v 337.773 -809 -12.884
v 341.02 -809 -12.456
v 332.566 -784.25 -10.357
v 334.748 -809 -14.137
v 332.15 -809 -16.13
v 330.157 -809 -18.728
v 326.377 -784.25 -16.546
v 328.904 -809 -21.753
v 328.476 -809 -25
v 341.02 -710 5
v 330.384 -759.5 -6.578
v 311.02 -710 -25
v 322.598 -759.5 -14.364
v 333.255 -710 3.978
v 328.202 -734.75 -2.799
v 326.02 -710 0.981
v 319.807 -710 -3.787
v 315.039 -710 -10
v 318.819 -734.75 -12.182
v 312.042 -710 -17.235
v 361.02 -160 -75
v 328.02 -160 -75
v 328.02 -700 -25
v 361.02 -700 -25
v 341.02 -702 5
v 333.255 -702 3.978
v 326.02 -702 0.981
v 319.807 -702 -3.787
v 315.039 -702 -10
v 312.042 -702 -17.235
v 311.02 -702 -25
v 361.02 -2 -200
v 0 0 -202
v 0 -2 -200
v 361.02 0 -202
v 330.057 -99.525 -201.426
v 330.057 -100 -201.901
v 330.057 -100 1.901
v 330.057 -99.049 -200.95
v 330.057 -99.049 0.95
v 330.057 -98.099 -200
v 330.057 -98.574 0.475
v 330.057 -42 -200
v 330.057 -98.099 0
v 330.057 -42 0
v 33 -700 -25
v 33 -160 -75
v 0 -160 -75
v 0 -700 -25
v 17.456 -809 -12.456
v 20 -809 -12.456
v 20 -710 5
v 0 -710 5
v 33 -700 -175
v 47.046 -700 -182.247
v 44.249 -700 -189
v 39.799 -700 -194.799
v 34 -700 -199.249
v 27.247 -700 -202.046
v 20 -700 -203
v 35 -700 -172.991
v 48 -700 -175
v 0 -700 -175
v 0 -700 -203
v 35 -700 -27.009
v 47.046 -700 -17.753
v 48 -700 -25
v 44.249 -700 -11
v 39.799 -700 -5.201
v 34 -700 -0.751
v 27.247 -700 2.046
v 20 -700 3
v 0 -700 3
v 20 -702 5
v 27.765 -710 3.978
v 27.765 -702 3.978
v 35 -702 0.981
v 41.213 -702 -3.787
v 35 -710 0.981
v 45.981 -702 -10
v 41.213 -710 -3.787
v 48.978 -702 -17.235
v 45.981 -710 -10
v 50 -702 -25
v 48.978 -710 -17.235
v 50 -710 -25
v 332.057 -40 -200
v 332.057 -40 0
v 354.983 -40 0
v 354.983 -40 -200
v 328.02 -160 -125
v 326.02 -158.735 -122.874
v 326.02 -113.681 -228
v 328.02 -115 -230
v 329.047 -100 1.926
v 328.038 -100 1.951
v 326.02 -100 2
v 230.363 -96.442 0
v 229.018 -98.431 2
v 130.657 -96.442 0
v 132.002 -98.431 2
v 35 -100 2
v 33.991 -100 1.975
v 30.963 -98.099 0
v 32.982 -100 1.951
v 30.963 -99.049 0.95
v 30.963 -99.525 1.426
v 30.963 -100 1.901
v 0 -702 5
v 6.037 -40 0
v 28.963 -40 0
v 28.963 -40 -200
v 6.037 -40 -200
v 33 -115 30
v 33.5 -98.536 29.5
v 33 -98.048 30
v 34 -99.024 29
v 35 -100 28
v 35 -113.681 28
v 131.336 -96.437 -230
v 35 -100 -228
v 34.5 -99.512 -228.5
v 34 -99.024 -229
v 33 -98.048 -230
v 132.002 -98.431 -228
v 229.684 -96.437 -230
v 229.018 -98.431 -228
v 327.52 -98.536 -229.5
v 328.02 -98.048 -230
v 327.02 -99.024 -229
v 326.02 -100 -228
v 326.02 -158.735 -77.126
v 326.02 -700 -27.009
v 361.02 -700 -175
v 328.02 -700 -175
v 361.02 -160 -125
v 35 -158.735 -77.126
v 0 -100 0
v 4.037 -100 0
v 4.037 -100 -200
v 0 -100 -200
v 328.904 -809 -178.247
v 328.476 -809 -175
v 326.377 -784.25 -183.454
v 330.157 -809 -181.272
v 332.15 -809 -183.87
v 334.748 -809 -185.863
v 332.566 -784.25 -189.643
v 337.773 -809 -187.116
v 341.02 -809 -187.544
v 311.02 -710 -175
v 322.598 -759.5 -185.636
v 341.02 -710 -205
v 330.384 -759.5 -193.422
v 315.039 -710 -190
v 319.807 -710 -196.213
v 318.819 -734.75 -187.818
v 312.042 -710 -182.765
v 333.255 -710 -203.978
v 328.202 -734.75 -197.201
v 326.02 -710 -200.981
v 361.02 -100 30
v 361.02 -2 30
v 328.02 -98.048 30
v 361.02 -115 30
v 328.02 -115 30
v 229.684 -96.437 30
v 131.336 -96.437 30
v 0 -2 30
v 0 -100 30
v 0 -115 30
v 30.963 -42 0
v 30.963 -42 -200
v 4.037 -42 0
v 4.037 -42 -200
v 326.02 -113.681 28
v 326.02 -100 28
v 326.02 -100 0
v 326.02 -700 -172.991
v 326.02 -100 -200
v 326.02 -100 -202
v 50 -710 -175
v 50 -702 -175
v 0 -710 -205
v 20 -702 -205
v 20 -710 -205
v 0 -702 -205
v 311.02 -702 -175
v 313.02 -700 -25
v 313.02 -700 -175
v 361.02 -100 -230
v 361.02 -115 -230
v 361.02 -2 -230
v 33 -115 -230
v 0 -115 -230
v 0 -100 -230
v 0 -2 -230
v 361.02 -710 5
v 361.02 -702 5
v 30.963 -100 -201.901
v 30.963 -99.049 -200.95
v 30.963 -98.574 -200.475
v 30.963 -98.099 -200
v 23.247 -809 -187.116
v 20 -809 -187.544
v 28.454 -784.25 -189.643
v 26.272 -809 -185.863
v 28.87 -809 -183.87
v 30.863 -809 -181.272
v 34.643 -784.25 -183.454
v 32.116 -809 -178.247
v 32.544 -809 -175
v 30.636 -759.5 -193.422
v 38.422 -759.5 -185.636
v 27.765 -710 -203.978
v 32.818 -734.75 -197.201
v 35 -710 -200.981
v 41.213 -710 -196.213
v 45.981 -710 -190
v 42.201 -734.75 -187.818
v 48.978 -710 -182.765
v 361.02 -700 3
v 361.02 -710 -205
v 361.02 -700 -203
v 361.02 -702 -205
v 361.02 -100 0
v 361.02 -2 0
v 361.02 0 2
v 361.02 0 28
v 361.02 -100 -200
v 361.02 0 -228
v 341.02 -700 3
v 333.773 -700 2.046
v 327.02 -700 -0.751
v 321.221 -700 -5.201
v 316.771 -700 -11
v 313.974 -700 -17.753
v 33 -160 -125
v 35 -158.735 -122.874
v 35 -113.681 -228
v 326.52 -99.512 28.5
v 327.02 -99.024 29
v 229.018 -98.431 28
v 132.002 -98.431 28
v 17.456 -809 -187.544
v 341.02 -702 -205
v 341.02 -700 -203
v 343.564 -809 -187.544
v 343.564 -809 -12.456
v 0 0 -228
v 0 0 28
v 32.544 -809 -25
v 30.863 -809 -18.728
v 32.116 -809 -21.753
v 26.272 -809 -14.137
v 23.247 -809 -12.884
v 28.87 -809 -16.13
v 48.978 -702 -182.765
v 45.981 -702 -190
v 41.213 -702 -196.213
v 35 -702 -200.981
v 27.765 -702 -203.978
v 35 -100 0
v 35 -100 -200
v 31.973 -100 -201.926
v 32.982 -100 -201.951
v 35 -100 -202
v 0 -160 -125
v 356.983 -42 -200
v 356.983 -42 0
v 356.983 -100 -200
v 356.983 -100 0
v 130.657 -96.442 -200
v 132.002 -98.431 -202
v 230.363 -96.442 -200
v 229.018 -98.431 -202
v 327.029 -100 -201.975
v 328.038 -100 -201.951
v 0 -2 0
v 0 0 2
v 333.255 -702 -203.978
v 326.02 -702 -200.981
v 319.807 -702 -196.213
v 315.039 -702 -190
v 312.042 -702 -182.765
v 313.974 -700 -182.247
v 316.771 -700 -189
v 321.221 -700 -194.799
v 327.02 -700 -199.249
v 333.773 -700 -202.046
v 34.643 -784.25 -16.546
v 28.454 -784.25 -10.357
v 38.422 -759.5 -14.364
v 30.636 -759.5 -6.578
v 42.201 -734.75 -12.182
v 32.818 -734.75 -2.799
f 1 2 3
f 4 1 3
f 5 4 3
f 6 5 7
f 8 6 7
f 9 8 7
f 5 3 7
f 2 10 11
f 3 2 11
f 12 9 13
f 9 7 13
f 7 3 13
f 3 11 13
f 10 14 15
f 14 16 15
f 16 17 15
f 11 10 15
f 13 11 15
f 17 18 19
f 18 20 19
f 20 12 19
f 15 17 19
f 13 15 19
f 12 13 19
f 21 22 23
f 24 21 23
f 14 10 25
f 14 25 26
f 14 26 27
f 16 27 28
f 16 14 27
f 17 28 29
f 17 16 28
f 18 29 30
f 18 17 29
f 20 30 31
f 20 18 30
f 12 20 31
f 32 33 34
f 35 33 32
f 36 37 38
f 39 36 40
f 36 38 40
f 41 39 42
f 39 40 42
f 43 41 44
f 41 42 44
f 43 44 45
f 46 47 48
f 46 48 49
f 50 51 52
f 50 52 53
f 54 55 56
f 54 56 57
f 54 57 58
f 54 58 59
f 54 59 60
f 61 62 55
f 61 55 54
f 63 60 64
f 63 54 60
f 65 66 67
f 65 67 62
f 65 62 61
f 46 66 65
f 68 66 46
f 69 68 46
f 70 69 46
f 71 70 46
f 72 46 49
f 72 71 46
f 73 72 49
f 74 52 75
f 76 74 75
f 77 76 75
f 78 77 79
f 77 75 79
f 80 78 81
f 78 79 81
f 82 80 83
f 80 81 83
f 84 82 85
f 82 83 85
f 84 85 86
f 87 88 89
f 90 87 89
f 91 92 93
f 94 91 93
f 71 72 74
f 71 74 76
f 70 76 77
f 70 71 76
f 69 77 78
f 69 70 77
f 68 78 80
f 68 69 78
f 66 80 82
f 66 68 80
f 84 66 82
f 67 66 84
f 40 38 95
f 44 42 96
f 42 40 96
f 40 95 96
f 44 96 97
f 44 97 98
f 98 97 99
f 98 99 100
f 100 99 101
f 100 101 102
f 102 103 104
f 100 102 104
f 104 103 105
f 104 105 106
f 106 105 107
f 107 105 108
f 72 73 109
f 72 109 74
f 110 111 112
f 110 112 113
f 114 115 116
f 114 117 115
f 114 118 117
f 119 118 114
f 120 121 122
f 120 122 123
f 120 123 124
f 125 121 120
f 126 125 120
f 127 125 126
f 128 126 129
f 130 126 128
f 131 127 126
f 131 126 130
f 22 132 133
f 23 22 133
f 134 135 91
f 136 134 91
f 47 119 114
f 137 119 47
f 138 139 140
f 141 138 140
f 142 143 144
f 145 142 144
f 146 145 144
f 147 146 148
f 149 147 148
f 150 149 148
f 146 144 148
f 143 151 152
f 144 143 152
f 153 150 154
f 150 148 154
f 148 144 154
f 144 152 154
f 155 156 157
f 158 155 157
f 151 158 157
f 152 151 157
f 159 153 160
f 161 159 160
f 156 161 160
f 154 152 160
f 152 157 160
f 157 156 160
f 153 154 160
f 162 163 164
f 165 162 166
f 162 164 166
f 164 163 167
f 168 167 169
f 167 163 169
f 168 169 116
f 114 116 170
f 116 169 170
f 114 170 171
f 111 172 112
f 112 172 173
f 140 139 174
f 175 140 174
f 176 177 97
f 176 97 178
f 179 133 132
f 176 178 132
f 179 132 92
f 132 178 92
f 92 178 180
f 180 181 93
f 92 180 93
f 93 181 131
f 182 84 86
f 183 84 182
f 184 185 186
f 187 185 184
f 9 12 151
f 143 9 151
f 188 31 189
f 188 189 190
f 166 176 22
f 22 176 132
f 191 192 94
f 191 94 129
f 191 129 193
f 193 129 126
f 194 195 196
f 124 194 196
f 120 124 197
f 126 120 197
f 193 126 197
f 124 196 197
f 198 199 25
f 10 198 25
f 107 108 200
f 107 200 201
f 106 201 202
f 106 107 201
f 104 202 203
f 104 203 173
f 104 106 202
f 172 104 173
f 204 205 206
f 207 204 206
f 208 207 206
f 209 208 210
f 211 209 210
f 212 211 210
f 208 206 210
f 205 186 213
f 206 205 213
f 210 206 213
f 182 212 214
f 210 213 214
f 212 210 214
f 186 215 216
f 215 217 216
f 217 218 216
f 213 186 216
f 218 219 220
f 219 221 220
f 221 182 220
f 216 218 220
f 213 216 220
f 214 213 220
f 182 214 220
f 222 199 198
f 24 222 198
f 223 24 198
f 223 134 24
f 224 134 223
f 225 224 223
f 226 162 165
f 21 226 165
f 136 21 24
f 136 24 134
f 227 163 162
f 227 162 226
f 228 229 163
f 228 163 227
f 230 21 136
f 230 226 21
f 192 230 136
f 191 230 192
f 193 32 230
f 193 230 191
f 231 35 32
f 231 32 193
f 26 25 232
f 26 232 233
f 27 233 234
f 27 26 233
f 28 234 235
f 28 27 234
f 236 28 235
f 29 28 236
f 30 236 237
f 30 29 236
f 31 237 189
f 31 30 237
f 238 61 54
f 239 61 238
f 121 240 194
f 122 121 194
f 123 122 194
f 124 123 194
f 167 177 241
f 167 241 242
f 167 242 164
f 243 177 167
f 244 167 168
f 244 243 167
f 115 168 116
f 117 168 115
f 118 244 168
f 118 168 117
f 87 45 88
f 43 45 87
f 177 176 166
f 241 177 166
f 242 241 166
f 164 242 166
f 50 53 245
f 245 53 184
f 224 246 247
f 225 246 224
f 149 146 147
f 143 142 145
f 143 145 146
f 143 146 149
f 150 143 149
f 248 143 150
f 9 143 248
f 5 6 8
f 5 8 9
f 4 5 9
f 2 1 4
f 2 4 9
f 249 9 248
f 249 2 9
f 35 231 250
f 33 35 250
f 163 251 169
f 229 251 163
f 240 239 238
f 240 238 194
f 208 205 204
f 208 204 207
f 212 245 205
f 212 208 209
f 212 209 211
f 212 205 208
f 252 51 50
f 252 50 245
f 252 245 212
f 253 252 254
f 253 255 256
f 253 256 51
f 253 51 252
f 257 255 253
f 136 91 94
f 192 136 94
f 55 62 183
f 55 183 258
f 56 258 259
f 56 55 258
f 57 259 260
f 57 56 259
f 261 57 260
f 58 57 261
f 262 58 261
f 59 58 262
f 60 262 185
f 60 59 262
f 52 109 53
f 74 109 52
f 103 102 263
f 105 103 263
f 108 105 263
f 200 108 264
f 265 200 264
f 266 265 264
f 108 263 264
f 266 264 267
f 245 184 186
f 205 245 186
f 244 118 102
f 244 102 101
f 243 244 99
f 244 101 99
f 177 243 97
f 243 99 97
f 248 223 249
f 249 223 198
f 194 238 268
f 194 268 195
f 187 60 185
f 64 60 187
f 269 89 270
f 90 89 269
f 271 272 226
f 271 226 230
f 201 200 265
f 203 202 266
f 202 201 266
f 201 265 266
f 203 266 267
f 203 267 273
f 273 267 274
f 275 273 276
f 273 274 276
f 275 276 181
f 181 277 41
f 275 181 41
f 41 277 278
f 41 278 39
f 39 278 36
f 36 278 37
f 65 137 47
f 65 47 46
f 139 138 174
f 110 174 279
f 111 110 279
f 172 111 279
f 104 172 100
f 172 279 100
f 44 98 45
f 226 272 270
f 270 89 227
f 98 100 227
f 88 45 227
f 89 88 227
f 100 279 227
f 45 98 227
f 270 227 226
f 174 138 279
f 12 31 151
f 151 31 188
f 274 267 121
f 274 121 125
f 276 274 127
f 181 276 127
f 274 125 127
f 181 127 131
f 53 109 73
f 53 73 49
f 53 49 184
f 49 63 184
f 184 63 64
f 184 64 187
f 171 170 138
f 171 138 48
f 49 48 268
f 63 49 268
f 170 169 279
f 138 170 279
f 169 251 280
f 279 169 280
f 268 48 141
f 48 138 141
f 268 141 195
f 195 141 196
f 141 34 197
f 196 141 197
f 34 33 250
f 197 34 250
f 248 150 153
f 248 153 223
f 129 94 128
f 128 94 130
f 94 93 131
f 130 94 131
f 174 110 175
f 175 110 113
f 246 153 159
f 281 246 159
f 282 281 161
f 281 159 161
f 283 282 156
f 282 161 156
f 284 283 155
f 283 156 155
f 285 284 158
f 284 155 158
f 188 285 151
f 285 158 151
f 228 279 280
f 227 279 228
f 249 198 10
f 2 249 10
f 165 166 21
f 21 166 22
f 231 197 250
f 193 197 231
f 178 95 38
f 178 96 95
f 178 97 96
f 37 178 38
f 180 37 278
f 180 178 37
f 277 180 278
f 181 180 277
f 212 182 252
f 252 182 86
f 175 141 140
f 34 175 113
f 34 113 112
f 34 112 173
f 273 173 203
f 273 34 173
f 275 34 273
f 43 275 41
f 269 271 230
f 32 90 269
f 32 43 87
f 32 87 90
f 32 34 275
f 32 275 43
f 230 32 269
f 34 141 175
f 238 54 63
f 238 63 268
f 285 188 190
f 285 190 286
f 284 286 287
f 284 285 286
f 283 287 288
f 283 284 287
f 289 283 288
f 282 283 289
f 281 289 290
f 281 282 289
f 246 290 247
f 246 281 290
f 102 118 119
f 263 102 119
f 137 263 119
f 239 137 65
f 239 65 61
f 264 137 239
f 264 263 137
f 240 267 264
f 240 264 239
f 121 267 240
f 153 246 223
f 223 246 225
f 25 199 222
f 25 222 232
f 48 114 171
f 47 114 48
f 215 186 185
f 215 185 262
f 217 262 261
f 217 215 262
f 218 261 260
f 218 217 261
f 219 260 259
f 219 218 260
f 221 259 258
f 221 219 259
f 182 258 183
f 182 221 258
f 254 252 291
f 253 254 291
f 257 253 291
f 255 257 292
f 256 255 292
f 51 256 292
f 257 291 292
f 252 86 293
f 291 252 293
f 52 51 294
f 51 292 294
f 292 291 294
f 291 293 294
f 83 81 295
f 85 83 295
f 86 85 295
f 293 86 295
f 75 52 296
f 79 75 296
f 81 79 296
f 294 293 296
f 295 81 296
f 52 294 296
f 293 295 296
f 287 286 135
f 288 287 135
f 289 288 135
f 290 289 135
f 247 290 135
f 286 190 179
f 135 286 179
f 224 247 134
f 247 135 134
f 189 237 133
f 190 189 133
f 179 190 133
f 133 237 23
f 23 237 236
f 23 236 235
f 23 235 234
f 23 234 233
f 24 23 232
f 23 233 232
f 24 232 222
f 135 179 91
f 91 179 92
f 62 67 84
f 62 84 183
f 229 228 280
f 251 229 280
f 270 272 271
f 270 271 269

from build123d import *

# Parameters (mm, degrees)
BOSS_EXTRUDE1_DEPTH           = 30
SKETCH2_W                     = 26.926999998
SKETCH2_H                     = 60
BOSS_EXTRUDE2_DEPTH           = 200
BOSS_EXTRUDE3_START           = 30
BOSS_EXTRUDE3_DEPTH           = 30
BOSS_EXTRUDE4_DEPTH           = 4.0365
BOSS_EXTRUDE4_DEPTH_BACK      = 30.9635
BOSS_EXTRUDE5_DEPTH           = 10
FILLET1_R                     = 30
SKETCH7_W                     = 260
SKETCH7_H                     = 710
CUT_EXTRUDE1_DEPTH            = 768.843643003
CHAMFER1_SIZE                 = 2
CHAMFER2_SIZE                 = 2
CHAMFER3_SIZE                 = 2
CHAMFER4_SIZE                 = 2
CHAMFER6_SIZE                 = 2
BOSS_EXTRUDE6_DEPTH           = 99
BOSS_EXTRUDE6_DRAFT           = 10
BOSS_EXTRUDE6_PROFILE_2_DEPTH = 99
BOSS_EXTRUDE6_PROFILE_2_DRAFT = 10


with BuildPart() as part:
    # Sketch1 → Boss-Extrude1 (new body)
    with BuildSketch(Plane.XY):
        with BuildLine():
            Line((0, 0), (361.02, 0))
            Line((361.02, 0), (361.02, -100))
            Line((361.02, -100), (326.02, -100))
            ThreePointArc((326.02, -100), (180.51, -98.235310481), (35, -100))
            Line((35, -100), (0, -100))
            Line((0, -100), (0, 0))
        make_face()
    extrude(amount=BOSS_EXTRUDE1_DEPTH)

    # Sketch2 → Boss-Extrude2 (add)
    with BuildSketch(Plane(origin=(0, 0, 0), x_dir=(-1, 0, 0), z_dir=(0, 0, -1))):
        with Locations((-343.52, -70)):
            Rectangle(SKETCH2_W, SKETCH2_H)
        with Locations((-17.5, -70)):
            Rectangle(SKETCH2_W, SKETCH2_H)
    extrude(amount=BOSS_EXTRUDE2_DEPTH)

    # Sketch3 → Boss-Extrude3 (add)
    with BuildSketch(Plane(origin=(0, 0, -200), x_dir=(-1, 0, 0), z_dir=(0, 0, -1)).offset(BOSS_EXTRUDE3_START)):
        with BuildLine():
            Line((0, -100), (0, 0))
            Line((0, 0), (-361.02, 0))
            Line((-361.02, 0), (-361.02, -100))
            Line((-361.02, -100), (-326.02, -100))
            ThreePointArc((-326.02, -100), (-180.51, -98.235310481), (-35, -100))
            Line((-35, -100), (0, -100))
        make_face()
    extrude(amount=-BOSS_EXTRUDE3_DEPTH)

    # Sketch5 → Boss-Extrude4 (add, two sides: drawn at the far end of the back side and taken through both)
    with BuildSketch(Plane.ZY.offset(-4.036500001).offset(-BOSS_EXTRUDE4_DEPTH_BACK)):
        Polygon((-200, -100), (0, -100), (30, -100), (30, -115), (-75, -160), (-25, -700), (-100, -700), (-175, -700), (-125, -160), (-230, -115), (-230, -100), align=None)
    extrude(amount=BOSS_EXTRUDE4_DEPTH + BOSS_EXTRUDE4_DEPTH_BACK)

    # Sketch6 → Boss-Extrude5 (add)
    with BuildSketch(Plane.XZ.offset(700)):
        Polygon((0, -25), (0, 5), (50, 5), (50, -205), (0, -205), (0, -175), align=None)
    extrude(amount=BOSS_EXTRUDE5_DEPTH)

    # Fillet1
    fillet1_edges = [part.edges().sort_by_distance(p)[0] for p in [
        (50, -705, -205),
        (50, -705, 5),
    ]]
    fillet(fillet1_edges, radius=FILLET1_R)

    # Sketch7 → Cut-Extrude1 (cut, through all)
    with BuildSketch(Plane(origin=(180.51, 0, 0), x_dir=(0, 0, -1), z_dir=(1, 0, 0))):
        with Locations((100, -355)):
            Rectangle(SKETCH7_W, SKETCH7_H)
    extrude(amount=CUT_EXTRUDE1_DEPTH, mode=Mode.SUBTRACT)

    # Mirror2: part across plane


with BuildPart() as part_1:
    add(part.part)
    add(part.part.mirror(Plane(origin=(180.51, 0, 0), x_dir=(0, 0, 1), z_dir=(1, 0, 0))))

    # Chamfer1
    chamfer1_edges = [part_1.edges().sort_by_distance(p)[0] for p in [
        (180.51, 0, 30),
        (180.51, 0, 0),
        (180.51, 0, -200),
        (180.51, 0, -230),
    ]]
    chamfer(chamfer1_edges, length=CHAMFER1_SIZE)

    # Chamfer2
    chamfer2_edges = [part_1.edges().sort_by_distance(p)[0] for p in [
        (356.983499999, -40, -100),
        (330.056500001, -40, -100),
        (4.036500001, -40, -100),
        (30.963499999, -40, -100),
    ]]
    chamfer(chamfer2_edges, length=CHAMFER2_SIZE)

    # Chamfer3
    chamfer3_edges = [part_1.edges().sort_by_distance(p)[0] for p in [
        (326.019999999, -107.5, -230),
        (326.019999999, -137.5, -177.5),
        (326.019999999, -430, -150),
        (326.019999999, -430, -50),
        (326.019999999, -137.5, -22.5),
        (326.019999999, -107.5, 30),
        (35.000000001, -107.5, 30),
        (35.000000001, -137.5, -22.5),
        (35.000000001, -430, -50),
        (35.000000001, -430, -150),
        (35.000000001, -137.5, -177.5),
        (35.000000001, -107.5, -230),
    ]]
    chamfer(chamfer3_edges, length=CHAMFER3_SIZE)

    # Chamfer4
    chamfer4_edges = [part_1.edges().sort_by_distance(p)[0] for p in [
        (50, -700, -100),
        (10, -700, 5),
        (41.213203436, -700, -3.786796564),
        (41.213203436, -700, -196.213203436),
        (311.02, -700, -100),
        (351.02, -700, 5),
        (351.02, -700, -205),
        (319.806796564, -700, -196.213203436),
        (319.806796564, -700, -3.786796564),
        (10, -700, -205),
    ]]
    chamfer(chamfer4_edges, length=CHAMFER4_SIZE)

    # Chamfer6
    # the kernel refuses this chamfer: 2 mm, written as the material it takes off along each edge
    with BuildSketch(Plane(origin=(180.51, -6098.235310479, 30), x_dir=(0.025441959758898923, 0.9996763009512762, 0), z_dir=(0.9996763009512762, -0.025441959758898923, 0))) as chamfer6_piece_1_section:
        Polygon((5999.999999998 + CHAMFER6_SIZE, 0), (5999.999999998, -CHAMFER6_SIZE), (5999.999999998, 0), align=None)
    chamfer6_piece_1 = revolve(axis=Axis((180.51, -6098.235310479, 30), (0, 0, 1)), revolution_arc=2.915748449, mode=Mode.PRIVATE)
    chamfer6_piece_1 = split(chamfer6_piece_1, bisect_by=Plane(origin=(327.145000629, -99.268037673, 29.12500063), z_dir=(-0.7071067811865476, 0, 0.7071067811865476)), keep=Keep.TOP, mode=Mode.PRIVATE)
    chamfer6_piece_1 = split(chamfer6_piece_1, bisect_by=Plane(origin=(180.135000332, -99.268037673, -117.135000331), z_dir=(0.7071067811865476, 0, 0.7071067811865476)), keep=Keep.TOP, mode=Mode.PRIVATE)
    add(chamfer6_piece_1, mode=Mode.SUBTRACT)
    with BuildSketch(Plane(origin=(180.51, -6098.235310479, 0), x_dir=(0.02510863351858876, 0.9996847285633752, 0), z_dir=(0.9996847285633752, -0.02510863351858876, 0))) as chamfer6_piece_2_section:
        Polygon((5999.999999998 + CHAMFER6_SIZE, 0), (5999.999999998, CHAMFER6_SIZE), (5999.999999998, 0), align=None)
    chamfer6_piece_2 = revolve(axis=Axis((180.51, -6098.235310479, 0), (0, 0, 1)), revolution_arc=2.877539868, mode=Mode.PRIVATE)
    chamfer6_piece_2 = split(chamfer6_piece_2, bisect_by=Plane(origin=(328.004034253, -100, 0.650481022), z_dir=(0, 1, 0)), keep=Keep.TOP, mode=Mode.PRIVATE)
    chamfer6_piece_2 = split(chamfer6_piece_2, bisect_by=Plane(origin=(330.056500001, -99.349322449, 0.650481022), z_dir=(-1, 0, 0)), keep=Keep.TOP, mode=Mode.PRIVATE)
    chamfer6_piece_2 = split(chamfer6_piece_2, bisect_by=Plane(origin=(30.963499999, -99.349322449, 0.650481022), z_dir=(1, 0, 0)), keep=Keep.TOP, mode=Mode.PRIVATE)
    add(chamfer6_piece_2, mode=Mode.SUBTRACT)
    with BuildSketch(Plane(origin=(180.51, -6098.235310479, -200), x_dir=(-0.025108633518586027, 0.9996847285633753, 0), z_dir=(-0.9996847285633753, -0.025108633518586027, 0))) as chamfer6_piece_3_section:
        Polygon((5999.999999998 + CHAMFER6_SIZE, 0), (5999.999999998, CHAMFER6_SIZE), (5999.999999998, 0), align=None)
    chamfer6_piece_3 = revolve(axis=Axis((180.51, -6098.235310479, -200), (0, 0, -1)), revolution_arc=2.877539868, mode=Mode.PRIVATE)
    chamfer6_piece_3 = split(chamfer6_piece_3, bisect_by=Plane(origin=(33.015965747, -100, -200.650481022), z_dir=(0, 1, 0)), keep=Keep.TOP, mode=Mode.PRIVATE)
    chamfer6_piece_3 = split(chamfer6_piece_3, bisect_by=Plane(origin=(330.056500001, -99.349322449, -200.650481022), z_dir=(-1, 0, 0)), keep=Keep.TOP, mode=Mode.PRIVATE)
    chamfer6_piece_3 = split(chamfer6_piece_3, bisect_by=Plane(origin=(30.963499999, -99.349322449, -200.650481022), z_dir=(1, 0, 0)), keep=Keep.TOP, mode=Mode.PRIVATE)
    add(chamfer6_piece_3, mode=Mode.SUBTRACT)
    with BuildSketch(Plane(origin=(180.51, -6098.235310479, -230), x_dir=(-0.025441959758894937, 0.9996763009512762, 0), z_dir=(-0.9996763009512762, -0.025441959758894937, 0))) as chamfer6_piece_4_section:
        Polygon((5999.999999998 + CHAMFER6_SIZE, 0), (5999.999999998, -CHAMFER6_SIZE), (5999.999999998, 0), align=None)
    chamfer6_piece_4 = revolve(axis=Axis((180.51, -6098.235310479, -230), (0, 0, -1)), revolution_arc=2.915748449, mode=Mode.PRIVATE)
    chamfer6_piece_4 = split(chamfer6_piece_4, bisect_by=Plane(origin=(180.884999668, -99.268037673, -82.864999669), z_dir=(-0.7071067811865476, 0, -0.7071067811865476)), keep=Keep.TOP, mode=Mode.PRIVATE)
    chamfer6_piece_4 = split(chamfer6_piece_4, bisect_by=Plane(origin=(33.874999371, -99.268037673, -229.12500063), z_dir=(0.7071067811865476, 0, -0.7071067811865476)), keep=Keep.TOP, mode=Mode.PRIVATE)
    add(chamfer6_piece_4, mode=Mode.SUBTRACT)


with BuildPart() as boss_extrude6_tool:
    # Sketch10 → Boss-Extrude6 (with draft: the straight prism first)
    with BuildSketch(Plane.XZ.offset(710)):
        with BuildLine():
            Line((341.02, -205), (361.02, -205))
            Line((361.02, -205), (361.02, 5))
            Line((361.02, 5), (341.02, 5))
            ThreePointArc((341.02, 5), (319.806796564, -3.786796564), (311.02, -25))
            Line((311.02, -25), (311.02, -175))
            ThreePointArc((311.02, -175), (319.806796564, -196.213203436), (341.02, -205))
        make_face()
    extrude(amount=BOSS_EXTRUDE6_DEPTH)
    # Boss-Extrude6: the draft: its side faces are tilted about the plane it starts from
    boss_extrude6_sides = [boss_extrude6_tool.faces().sort_by_distance(p)[0] for p in [
        (351.02, -759.5, -205),
        (361.02, -759.5, -100),
        (351.02, -759.5, 5),
        (319.806796564, -759.5, -3.786796564),
        (311.02, -759.5, -100),
        (319.806796564, -759.5, -196.213203436),
    ]]
    draft(boss_extrude6_sides, Plane.XZ.offset(710), BOSS_EXTRUDE6_DRAFT)


with BuildPart() as part_2:
    add(part_1.part)

    # Boss-Extrude6: add boss_extrude6_tool
    add(boss_extrude6_tool.part)


with BuildPart() as boss_extrude6_profile_2_tool:
    # Sketch10 → Boss-Extrude6 profile 2 (with draft: the straight prism first)
    with BuildSketch(Plane.XZ.offset(710)):
        with BuildLine():
            Line((0, -205), (20, -205))
            ThreePointArc((20, -205), (41.213203436, -196.213203436), (50, -175))
            Line((50, -175), (50, -25))
            ThreePointArc((50, -25), (41.213203436, -3.786796564), (20, 5))
            Line((20, 5), (0, 5))
            Line((0, 5), (0, -205))
        make_face()
    extrude(amount=BOSS_EXTRUDE6_PROFILE_2_DEPTH)
    # Boss-Extrude6 profile 2: the draft: its side faces are tilted about the plane it starts from
    boss_extrude6_profile_2_sides = [boss_extrude6_profile_2_tool.faces().sort_by_distance(p)[0] for p in [
        (10, -759.5, -205),
        (41.213203436, -759.5, -196.213203436),
        (50, -759.5, -100),
        (41.213203436, -759.5, -3.786796564),
        (10, -759.5, 5),
        (0, -759.5, -100),
    ]]
    draft(boss_extrude6_profile_2_sides, Plane.XZ.offset(710), BOSS_EXTRUDE6_PROFILE_2_DRAFT)


with BuildPart() as part_3:
    add(part_2.part)

    # Boss-Extrude6 profile 2: add boss_extrude6_profile_2_tool
    add(boss_extrude6_profile_2_tool.part)


solid = part_3.part
